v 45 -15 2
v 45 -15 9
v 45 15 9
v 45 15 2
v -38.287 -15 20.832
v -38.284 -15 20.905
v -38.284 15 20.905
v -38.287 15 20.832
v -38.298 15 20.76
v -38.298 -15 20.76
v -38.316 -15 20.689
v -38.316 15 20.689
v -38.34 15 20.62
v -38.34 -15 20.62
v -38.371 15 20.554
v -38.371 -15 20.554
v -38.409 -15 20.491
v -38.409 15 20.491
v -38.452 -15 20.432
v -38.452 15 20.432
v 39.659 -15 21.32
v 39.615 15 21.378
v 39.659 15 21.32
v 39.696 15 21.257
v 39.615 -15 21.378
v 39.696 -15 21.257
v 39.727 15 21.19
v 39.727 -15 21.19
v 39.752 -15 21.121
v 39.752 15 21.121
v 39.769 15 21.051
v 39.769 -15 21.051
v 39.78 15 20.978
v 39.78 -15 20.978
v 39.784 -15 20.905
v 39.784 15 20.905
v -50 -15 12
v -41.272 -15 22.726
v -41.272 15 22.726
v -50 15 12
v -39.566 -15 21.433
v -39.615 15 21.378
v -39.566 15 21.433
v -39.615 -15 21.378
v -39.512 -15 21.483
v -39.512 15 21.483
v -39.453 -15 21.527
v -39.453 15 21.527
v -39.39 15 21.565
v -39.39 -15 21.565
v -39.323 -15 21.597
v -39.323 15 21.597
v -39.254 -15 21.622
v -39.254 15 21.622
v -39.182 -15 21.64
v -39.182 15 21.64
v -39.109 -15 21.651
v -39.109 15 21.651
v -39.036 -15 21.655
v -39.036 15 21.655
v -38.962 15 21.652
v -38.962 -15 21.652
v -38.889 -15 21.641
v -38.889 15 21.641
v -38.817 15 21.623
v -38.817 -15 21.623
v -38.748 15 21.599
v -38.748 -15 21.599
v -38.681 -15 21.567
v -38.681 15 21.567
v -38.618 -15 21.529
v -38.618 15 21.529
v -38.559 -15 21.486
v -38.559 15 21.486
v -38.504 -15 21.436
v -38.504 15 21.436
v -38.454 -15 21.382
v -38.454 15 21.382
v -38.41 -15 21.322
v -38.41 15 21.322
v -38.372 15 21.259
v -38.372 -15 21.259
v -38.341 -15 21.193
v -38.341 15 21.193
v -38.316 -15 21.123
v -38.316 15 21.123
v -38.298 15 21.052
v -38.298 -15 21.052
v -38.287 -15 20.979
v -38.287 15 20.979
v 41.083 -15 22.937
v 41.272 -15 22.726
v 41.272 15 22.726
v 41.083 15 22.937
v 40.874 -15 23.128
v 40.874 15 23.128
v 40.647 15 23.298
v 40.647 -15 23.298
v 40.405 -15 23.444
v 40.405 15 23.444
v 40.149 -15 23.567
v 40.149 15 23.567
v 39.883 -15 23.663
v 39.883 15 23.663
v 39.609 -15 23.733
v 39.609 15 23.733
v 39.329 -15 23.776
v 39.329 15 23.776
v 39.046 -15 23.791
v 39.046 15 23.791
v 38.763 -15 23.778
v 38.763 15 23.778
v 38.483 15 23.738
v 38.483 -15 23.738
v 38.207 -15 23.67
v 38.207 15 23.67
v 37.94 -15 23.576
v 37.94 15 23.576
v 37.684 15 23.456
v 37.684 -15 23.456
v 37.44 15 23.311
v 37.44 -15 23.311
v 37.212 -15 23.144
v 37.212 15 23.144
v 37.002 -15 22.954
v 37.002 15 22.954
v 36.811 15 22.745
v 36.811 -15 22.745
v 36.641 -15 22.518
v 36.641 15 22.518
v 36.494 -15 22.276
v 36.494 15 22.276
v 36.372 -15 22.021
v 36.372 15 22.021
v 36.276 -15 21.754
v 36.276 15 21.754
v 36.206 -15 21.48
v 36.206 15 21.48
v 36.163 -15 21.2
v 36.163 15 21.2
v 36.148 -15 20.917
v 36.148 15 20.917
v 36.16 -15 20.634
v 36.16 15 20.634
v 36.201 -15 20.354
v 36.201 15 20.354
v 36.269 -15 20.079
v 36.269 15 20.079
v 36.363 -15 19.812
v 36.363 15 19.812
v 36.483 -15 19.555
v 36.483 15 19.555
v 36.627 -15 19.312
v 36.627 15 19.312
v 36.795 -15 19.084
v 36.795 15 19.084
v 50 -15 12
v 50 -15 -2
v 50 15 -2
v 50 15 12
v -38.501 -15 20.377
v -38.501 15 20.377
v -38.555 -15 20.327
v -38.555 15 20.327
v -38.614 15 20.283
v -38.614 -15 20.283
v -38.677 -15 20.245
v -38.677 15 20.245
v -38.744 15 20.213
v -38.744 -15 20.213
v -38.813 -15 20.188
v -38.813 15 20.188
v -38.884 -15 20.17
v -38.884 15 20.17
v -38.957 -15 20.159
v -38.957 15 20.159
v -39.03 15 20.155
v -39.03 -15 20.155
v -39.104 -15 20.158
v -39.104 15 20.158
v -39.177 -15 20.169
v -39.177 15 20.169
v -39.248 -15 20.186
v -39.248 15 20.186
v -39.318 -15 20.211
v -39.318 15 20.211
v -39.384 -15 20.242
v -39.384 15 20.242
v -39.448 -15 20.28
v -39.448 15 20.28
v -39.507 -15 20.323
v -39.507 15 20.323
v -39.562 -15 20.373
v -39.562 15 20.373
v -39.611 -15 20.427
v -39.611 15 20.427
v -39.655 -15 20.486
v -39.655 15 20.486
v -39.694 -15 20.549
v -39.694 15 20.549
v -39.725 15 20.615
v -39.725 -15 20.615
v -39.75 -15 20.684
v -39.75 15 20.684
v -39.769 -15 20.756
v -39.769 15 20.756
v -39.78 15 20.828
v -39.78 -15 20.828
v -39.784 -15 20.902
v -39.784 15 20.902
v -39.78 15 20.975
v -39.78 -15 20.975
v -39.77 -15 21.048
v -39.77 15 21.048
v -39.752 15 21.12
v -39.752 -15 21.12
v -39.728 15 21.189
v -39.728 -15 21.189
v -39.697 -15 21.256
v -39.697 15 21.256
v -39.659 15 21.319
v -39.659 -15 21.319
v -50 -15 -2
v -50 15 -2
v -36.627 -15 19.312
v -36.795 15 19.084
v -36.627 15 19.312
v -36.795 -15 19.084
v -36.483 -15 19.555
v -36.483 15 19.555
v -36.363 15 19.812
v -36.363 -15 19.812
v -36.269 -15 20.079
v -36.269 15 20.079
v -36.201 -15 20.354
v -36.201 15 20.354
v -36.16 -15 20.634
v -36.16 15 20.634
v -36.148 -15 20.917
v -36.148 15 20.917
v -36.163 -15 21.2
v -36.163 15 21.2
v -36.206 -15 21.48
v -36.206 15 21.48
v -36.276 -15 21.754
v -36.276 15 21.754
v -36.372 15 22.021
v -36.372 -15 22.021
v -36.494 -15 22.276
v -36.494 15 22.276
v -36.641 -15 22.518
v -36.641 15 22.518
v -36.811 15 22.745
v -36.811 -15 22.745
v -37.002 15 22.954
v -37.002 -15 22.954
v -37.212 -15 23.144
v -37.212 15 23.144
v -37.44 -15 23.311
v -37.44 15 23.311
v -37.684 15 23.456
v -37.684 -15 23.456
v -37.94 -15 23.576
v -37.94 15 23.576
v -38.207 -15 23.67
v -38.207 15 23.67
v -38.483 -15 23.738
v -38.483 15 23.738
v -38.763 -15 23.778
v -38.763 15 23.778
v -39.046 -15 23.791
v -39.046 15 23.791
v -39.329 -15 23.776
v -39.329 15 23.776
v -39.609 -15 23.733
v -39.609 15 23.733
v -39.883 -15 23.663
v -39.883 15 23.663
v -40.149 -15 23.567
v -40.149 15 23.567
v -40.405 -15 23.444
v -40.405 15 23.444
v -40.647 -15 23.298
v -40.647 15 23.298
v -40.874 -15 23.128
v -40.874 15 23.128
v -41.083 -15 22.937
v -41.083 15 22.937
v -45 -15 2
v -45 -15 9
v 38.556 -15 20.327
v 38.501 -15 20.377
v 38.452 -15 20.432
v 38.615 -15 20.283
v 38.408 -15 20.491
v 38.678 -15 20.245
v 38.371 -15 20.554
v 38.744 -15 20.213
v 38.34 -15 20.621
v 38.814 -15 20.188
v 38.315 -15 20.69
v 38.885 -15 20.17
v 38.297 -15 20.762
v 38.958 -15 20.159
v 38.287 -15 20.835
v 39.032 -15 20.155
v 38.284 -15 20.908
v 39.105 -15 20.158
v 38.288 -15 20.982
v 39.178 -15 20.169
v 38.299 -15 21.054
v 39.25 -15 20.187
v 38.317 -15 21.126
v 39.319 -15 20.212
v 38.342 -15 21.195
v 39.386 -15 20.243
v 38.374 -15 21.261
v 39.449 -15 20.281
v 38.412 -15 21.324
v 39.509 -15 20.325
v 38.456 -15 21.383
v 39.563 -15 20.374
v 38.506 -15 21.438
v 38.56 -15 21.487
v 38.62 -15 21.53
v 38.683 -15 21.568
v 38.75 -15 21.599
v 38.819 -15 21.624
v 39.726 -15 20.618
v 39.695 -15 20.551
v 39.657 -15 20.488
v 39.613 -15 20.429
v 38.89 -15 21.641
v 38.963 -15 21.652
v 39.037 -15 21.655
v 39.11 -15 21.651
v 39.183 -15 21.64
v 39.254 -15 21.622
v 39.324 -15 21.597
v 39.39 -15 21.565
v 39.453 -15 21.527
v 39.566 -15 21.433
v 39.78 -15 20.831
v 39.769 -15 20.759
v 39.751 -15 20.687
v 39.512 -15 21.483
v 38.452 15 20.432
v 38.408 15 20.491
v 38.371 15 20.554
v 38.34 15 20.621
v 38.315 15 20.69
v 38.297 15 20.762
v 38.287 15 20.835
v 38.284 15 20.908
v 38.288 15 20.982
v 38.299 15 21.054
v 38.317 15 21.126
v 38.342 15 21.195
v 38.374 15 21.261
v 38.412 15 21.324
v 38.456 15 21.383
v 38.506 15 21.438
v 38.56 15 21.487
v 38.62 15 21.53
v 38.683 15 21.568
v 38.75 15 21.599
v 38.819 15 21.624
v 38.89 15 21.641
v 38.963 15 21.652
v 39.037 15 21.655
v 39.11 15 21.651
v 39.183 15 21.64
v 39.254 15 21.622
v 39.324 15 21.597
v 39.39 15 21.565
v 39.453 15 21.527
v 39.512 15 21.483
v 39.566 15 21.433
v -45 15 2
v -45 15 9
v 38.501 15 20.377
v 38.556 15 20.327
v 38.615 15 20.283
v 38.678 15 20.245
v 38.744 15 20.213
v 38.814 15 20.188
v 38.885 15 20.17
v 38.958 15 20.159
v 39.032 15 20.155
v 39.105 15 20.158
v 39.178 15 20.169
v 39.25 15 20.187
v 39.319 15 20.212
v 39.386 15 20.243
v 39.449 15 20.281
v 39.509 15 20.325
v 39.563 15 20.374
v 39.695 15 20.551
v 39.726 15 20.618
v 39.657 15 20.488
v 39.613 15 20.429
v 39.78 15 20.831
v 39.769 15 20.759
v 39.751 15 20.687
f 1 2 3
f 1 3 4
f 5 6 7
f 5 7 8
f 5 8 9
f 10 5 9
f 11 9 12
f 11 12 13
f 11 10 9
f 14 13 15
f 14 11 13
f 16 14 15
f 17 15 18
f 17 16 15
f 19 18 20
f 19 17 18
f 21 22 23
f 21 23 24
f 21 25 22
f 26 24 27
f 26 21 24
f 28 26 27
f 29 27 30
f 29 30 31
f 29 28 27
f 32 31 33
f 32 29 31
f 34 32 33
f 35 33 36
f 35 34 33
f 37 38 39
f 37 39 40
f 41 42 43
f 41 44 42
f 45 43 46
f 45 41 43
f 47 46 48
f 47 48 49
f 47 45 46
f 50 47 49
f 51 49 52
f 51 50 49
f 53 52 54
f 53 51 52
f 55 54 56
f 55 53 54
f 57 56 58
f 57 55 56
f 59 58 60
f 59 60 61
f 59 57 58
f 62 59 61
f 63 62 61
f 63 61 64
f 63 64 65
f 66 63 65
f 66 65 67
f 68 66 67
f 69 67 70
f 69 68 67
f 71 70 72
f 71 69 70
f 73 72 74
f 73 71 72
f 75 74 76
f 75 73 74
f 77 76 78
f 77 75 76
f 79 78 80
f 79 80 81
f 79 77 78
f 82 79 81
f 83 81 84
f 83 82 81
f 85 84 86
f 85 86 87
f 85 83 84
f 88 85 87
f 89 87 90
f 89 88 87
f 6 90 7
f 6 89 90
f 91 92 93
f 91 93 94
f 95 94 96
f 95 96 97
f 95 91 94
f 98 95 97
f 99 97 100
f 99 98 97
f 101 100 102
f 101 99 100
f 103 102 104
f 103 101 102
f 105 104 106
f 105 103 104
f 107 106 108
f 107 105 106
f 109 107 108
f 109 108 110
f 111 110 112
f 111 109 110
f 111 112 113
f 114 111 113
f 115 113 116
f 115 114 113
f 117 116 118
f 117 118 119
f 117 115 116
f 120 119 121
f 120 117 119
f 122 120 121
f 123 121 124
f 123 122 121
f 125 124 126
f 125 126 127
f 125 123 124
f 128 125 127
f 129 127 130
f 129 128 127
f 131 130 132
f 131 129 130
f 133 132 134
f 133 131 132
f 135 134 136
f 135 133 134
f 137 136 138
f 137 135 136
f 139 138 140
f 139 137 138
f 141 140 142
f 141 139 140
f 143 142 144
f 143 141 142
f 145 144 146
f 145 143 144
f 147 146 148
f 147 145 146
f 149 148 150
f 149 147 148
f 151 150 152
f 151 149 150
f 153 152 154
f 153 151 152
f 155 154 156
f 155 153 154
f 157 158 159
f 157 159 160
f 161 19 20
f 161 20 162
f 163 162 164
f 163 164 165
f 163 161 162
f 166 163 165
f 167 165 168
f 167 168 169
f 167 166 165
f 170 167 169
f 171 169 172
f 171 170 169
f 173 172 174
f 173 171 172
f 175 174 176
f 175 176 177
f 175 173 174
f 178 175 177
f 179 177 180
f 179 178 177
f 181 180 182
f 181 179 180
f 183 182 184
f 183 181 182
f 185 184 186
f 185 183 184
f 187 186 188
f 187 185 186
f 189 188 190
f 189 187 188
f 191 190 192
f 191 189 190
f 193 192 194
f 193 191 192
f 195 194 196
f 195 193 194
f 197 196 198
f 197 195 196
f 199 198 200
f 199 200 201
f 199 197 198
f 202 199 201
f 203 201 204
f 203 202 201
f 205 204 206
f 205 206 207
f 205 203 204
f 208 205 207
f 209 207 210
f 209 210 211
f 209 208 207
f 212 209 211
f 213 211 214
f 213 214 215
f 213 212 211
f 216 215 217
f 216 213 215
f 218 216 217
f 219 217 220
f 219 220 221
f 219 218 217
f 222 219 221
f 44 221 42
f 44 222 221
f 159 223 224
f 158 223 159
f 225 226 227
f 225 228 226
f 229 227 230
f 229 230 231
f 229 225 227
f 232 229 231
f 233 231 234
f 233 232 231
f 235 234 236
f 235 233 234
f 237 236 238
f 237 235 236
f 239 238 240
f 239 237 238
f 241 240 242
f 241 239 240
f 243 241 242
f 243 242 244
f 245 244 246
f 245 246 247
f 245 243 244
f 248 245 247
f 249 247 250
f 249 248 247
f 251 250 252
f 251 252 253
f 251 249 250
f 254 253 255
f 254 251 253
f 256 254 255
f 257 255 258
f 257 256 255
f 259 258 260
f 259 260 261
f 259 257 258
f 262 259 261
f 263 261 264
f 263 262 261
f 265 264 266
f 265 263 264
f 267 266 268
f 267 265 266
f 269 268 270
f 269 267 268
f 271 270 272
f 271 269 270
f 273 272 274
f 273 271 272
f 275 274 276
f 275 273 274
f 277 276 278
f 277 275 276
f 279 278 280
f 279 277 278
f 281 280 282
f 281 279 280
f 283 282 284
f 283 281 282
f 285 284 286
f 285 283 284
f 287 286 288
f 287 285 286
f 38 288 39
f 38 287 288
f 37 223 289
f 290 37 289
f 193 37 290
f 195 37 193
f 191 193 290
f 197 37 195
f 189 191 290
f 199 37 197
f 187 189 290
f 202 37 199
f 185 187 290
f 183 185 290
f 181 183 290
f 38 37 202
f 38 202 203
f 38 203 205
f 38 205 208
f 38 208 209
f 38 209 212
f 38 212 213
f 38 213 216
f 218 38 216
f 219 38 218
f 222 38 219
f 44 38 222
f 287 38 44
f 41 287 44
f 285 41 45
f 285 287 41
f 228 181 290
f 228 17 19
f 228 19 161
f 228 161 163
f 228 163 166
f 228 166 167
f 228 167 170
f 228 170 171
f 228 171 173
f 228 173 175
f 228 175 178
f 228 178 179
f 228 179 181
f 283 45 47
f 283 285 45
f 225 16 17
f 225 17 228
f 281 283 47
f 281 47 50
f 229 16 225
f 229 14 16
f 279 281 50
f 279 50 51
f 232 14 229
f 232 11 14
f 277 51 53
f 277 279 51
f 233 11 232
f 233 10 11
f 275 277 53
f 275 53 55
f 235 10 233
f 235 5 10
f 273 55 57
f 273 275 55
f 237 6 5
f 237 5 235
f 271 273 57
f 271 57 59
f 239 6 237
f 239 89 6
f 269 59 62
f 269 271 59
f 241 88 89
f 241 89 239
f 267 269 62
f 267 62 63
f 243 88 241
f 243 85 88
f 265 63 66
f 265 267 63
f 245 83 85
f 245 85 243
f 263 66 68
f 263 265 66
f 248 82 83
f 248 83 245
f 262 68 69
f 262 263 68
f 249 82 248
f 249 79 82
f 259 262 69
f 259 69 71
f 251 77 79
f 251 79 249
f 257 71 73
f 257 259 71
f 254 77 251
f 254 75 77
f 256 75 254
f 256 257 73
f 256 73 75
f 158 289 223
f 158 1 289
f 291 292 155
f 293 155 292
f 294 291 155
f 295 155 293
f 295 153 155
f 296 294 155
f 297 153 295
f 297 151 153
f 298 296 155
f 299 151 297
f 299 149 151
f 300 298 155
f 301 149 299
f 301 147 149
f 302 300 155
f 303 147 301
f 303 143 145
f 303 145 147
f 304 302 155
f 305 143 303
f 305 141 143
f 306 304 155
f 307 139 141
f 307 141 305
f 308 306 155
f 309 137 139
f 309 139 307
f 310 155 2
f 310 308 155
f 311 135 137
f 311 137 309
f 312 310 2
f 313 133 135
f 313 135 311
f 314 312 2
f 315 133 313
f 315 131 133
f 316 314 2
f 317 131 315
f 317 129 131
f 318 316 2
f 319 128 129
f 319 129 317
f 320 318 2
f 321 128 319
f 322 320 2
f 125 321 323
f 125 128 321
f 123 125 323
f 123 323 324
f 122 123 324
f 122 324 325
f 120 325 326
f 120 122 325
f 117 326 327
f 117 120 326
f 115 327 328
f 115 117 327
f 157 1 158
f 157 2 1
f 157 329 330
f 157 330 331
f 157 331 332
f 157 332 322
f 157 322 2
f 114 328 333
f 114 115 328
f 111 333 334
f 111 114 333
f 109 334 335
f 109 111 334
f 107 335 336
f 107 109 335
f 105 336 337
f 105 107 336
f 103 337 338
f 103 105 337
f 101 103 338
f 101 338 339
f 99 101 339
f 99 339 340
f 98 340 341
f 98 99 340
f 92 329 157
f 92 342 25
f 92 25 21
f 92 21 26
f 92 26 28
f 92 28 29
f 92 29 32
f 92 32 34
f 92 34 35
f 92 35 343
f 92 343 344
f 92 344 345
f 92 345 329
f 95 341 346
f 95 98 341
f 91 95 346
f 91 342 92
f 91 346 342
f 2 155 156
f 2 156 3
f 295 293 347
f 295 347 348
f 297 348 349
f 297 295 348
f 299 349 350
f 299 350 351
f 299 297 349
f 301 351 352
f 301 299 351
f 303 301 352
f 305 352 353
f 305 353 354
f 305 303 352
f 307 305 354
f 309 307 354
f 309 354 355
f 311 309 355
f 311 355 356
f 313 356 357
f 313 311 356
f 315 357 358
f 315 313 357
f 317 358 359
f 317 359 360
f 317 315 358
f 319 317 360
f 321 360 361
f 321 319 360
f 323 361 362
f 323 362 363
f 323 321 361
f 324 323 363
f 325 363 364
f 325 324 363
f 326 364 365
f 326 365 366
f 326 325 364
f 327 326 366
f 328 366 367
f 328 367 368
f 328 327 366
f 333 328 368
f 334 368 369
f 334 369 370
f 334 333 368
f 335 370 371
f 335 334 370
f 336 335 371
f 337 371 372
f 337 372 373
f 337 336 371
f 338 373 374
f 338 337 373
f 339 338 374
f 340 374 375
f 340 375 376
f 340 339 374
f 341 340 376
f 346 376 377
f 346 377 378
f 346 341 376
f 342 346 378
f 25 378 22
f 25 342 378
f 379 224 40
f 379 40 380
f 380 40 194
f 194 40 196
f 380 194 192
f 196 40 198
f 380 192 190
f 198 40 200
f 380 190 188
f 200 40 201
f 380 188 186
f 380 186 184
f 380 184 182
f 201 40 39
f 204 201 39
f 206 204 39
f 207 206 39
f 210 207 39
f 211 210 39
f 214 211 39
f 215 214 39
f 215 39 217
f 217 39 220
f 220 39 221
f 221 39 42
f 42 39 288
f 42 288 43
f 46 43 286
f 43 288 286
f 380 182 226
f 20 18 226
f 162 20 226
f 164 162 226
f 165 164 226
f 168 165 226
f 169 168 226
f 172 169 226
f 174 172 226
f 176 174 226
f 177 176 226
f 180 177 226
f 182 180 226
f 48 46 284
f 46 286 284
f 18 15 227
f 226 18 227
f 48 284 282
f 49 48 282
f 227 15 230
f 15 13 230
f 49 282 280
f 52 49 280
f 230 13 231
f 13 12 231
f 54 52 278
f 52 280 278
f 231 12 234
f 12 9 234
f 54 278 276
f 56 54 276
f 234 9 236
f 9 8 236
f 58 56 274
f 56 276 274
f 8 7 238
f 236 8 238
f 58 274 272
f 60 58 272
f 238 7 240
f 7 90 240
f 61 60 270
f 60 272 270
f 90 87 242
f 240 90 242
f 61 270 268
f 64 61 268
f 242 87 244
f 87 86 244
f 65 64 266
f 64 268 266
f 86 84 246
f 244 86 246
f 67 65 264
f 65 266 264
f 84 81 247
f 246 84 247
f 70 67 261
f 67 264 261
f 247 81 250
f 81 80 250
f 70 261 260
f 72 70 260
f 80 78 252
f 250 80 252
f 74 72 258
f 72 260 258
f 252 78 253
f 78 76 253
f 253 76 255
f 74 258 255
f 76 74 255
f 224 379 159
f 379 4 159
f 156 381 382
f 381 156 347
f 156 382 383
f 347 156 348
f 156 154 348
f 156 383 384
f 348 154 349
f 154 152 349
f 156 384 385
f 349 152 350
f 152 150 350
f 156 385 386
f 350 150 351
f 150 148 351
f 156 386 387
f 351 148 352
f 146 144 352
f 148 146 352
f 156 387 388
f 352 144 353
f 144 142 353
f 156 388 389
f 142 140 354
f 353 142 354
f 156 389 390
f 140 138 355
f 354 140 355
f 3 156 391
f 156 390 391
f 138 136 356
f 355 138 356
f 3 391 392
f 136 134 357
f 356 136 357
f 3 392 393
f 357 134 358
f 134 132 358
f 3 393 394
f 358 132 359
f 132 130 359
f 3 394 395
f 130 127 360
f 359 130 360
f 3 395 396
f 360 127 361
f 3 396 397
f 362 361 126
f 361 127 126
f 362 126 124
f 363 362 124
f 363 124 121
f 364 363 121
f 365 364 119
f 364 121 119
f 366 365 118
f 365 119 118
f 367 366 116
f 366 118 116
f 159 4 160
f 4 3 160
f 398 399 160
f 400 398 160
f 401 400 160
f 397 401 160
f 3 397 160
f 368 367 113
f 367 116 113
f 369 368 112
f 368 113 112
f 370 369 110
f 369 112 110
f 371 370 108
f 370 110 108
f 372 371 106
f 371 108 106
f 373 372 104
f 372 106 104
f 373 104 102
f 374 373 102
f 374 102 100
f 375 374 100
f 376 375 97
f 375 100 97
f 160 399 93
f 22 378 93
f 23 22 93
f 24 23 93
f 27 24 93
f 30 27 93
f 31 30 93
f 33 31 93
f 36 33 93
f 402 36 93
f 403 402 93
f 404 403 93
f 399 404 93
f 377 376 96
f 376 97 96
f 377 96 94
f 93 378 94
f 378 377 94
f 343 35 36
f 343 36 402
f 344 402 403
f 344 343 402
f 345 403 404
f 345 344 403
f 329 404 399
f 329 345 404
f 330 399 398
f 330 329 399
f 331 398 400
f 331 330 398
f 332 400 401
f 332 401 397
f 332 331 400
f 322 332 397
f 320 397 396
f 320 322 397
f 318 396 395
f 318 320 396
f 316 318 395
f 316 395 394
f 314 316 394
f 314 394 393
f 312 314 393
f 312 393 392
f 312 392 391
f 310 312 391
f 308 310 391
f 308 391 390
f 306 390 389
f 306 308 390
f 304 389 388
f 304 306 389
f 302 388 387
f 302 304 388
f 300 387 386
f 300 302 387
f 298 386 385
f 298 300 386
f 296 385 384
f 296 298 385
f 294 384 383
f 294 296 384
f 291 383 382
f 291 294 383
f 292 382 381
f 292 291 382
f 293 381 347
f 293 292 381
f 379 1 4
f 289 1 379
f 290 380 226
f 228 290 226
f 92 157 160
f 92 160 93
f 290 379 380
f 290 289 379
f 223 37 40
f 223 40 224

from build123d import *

# Parameters (mm, degrees)
F1_DEPTH = 15


with BuildPart() as f1:
    # F0 (on Front) → F1 (new body, symmetric)
    with BuildSketch(Plane.XZ):
        with BuildLine():
            Line((-38.451876, 20.431713), (-36.795144, 19.083667))
            ThreePointArc((-36.795144, 19.083667), (-37.212223, 23.143551), (-41.272107, 22.726473))
            Line((-41.272107, 22.726473), (-39.615376, 21.378427))
            ThreePointArc((-39.615376, 21.378427), (-38.782441, 21.611757), (-38.283626, 20.90507))
            ThreePointArc((-38.283626, 20.90507), (-38.326939, 20.653885), (-38.451876, 20.431713))
        make_face()
        with BuildLine():
            Line((-50, 2), (-45, 2))
            Line((-45, 2), (-45, 9))
            Line((-45, 9), (-36.795144, 19.083667))
            Line((-36.795144, 19.083667), (-38.451876, 20.431713))
            ThreePointArc((-38.451876, 20.431713), (-39.506983, 20.32332), (-39.615376, 21.378427))
            Line((-39.615376, 21.378427), (-41.272107, 22.726473))
            Line((-41.272107, 22.726473), (-50, 12))
            Line((-50, 12), (-50, 2))
        make_face()
        Polygon((50, -2), (50, 2), (45, 2), (-45, 2), (-50, 2), (-50, -2), align=None)
        with BuildLine():
            Line((45, 2), (50, 2))
            Line((50, 2), (50, 12))
            Line((50, 12), (41.272107, 22.726473))
            Line((41.272107, 22.726473), (39.615376, 21.378427))
            ThreePointArc((39.615376, 21.378427), (39.740312, 21.156254), (39.783626, 20.90507))
            ThreePointArc((39.783626, 20.90507), (39.28481, 20.198383), (38.451876, 20.431713))
            Line((38.451876, 20.431713), (36.795144, 19.083667))
            Line((36.795144, 19.083667), (45, 9))
            Line((45, 9), (45, 2))
        make_face()
        with BuildLine():
            Line((39.615376, 21.378427), (41.272107, 22.726473))
            ThreePointArc((41.272107, 22.726473), (37.212223, 23.143551), (36.795144, 19.083667))
            Line((36.795144, 19.083667), (38.451876, 20.431713))
            ThreePointArc((38.451876, 20.431713), (38.560268, 21.48682), (39.615376, 21.378427))
        make_face()
    extrude(amount=F1_DEPTH, both=True)


solid = f1.part
